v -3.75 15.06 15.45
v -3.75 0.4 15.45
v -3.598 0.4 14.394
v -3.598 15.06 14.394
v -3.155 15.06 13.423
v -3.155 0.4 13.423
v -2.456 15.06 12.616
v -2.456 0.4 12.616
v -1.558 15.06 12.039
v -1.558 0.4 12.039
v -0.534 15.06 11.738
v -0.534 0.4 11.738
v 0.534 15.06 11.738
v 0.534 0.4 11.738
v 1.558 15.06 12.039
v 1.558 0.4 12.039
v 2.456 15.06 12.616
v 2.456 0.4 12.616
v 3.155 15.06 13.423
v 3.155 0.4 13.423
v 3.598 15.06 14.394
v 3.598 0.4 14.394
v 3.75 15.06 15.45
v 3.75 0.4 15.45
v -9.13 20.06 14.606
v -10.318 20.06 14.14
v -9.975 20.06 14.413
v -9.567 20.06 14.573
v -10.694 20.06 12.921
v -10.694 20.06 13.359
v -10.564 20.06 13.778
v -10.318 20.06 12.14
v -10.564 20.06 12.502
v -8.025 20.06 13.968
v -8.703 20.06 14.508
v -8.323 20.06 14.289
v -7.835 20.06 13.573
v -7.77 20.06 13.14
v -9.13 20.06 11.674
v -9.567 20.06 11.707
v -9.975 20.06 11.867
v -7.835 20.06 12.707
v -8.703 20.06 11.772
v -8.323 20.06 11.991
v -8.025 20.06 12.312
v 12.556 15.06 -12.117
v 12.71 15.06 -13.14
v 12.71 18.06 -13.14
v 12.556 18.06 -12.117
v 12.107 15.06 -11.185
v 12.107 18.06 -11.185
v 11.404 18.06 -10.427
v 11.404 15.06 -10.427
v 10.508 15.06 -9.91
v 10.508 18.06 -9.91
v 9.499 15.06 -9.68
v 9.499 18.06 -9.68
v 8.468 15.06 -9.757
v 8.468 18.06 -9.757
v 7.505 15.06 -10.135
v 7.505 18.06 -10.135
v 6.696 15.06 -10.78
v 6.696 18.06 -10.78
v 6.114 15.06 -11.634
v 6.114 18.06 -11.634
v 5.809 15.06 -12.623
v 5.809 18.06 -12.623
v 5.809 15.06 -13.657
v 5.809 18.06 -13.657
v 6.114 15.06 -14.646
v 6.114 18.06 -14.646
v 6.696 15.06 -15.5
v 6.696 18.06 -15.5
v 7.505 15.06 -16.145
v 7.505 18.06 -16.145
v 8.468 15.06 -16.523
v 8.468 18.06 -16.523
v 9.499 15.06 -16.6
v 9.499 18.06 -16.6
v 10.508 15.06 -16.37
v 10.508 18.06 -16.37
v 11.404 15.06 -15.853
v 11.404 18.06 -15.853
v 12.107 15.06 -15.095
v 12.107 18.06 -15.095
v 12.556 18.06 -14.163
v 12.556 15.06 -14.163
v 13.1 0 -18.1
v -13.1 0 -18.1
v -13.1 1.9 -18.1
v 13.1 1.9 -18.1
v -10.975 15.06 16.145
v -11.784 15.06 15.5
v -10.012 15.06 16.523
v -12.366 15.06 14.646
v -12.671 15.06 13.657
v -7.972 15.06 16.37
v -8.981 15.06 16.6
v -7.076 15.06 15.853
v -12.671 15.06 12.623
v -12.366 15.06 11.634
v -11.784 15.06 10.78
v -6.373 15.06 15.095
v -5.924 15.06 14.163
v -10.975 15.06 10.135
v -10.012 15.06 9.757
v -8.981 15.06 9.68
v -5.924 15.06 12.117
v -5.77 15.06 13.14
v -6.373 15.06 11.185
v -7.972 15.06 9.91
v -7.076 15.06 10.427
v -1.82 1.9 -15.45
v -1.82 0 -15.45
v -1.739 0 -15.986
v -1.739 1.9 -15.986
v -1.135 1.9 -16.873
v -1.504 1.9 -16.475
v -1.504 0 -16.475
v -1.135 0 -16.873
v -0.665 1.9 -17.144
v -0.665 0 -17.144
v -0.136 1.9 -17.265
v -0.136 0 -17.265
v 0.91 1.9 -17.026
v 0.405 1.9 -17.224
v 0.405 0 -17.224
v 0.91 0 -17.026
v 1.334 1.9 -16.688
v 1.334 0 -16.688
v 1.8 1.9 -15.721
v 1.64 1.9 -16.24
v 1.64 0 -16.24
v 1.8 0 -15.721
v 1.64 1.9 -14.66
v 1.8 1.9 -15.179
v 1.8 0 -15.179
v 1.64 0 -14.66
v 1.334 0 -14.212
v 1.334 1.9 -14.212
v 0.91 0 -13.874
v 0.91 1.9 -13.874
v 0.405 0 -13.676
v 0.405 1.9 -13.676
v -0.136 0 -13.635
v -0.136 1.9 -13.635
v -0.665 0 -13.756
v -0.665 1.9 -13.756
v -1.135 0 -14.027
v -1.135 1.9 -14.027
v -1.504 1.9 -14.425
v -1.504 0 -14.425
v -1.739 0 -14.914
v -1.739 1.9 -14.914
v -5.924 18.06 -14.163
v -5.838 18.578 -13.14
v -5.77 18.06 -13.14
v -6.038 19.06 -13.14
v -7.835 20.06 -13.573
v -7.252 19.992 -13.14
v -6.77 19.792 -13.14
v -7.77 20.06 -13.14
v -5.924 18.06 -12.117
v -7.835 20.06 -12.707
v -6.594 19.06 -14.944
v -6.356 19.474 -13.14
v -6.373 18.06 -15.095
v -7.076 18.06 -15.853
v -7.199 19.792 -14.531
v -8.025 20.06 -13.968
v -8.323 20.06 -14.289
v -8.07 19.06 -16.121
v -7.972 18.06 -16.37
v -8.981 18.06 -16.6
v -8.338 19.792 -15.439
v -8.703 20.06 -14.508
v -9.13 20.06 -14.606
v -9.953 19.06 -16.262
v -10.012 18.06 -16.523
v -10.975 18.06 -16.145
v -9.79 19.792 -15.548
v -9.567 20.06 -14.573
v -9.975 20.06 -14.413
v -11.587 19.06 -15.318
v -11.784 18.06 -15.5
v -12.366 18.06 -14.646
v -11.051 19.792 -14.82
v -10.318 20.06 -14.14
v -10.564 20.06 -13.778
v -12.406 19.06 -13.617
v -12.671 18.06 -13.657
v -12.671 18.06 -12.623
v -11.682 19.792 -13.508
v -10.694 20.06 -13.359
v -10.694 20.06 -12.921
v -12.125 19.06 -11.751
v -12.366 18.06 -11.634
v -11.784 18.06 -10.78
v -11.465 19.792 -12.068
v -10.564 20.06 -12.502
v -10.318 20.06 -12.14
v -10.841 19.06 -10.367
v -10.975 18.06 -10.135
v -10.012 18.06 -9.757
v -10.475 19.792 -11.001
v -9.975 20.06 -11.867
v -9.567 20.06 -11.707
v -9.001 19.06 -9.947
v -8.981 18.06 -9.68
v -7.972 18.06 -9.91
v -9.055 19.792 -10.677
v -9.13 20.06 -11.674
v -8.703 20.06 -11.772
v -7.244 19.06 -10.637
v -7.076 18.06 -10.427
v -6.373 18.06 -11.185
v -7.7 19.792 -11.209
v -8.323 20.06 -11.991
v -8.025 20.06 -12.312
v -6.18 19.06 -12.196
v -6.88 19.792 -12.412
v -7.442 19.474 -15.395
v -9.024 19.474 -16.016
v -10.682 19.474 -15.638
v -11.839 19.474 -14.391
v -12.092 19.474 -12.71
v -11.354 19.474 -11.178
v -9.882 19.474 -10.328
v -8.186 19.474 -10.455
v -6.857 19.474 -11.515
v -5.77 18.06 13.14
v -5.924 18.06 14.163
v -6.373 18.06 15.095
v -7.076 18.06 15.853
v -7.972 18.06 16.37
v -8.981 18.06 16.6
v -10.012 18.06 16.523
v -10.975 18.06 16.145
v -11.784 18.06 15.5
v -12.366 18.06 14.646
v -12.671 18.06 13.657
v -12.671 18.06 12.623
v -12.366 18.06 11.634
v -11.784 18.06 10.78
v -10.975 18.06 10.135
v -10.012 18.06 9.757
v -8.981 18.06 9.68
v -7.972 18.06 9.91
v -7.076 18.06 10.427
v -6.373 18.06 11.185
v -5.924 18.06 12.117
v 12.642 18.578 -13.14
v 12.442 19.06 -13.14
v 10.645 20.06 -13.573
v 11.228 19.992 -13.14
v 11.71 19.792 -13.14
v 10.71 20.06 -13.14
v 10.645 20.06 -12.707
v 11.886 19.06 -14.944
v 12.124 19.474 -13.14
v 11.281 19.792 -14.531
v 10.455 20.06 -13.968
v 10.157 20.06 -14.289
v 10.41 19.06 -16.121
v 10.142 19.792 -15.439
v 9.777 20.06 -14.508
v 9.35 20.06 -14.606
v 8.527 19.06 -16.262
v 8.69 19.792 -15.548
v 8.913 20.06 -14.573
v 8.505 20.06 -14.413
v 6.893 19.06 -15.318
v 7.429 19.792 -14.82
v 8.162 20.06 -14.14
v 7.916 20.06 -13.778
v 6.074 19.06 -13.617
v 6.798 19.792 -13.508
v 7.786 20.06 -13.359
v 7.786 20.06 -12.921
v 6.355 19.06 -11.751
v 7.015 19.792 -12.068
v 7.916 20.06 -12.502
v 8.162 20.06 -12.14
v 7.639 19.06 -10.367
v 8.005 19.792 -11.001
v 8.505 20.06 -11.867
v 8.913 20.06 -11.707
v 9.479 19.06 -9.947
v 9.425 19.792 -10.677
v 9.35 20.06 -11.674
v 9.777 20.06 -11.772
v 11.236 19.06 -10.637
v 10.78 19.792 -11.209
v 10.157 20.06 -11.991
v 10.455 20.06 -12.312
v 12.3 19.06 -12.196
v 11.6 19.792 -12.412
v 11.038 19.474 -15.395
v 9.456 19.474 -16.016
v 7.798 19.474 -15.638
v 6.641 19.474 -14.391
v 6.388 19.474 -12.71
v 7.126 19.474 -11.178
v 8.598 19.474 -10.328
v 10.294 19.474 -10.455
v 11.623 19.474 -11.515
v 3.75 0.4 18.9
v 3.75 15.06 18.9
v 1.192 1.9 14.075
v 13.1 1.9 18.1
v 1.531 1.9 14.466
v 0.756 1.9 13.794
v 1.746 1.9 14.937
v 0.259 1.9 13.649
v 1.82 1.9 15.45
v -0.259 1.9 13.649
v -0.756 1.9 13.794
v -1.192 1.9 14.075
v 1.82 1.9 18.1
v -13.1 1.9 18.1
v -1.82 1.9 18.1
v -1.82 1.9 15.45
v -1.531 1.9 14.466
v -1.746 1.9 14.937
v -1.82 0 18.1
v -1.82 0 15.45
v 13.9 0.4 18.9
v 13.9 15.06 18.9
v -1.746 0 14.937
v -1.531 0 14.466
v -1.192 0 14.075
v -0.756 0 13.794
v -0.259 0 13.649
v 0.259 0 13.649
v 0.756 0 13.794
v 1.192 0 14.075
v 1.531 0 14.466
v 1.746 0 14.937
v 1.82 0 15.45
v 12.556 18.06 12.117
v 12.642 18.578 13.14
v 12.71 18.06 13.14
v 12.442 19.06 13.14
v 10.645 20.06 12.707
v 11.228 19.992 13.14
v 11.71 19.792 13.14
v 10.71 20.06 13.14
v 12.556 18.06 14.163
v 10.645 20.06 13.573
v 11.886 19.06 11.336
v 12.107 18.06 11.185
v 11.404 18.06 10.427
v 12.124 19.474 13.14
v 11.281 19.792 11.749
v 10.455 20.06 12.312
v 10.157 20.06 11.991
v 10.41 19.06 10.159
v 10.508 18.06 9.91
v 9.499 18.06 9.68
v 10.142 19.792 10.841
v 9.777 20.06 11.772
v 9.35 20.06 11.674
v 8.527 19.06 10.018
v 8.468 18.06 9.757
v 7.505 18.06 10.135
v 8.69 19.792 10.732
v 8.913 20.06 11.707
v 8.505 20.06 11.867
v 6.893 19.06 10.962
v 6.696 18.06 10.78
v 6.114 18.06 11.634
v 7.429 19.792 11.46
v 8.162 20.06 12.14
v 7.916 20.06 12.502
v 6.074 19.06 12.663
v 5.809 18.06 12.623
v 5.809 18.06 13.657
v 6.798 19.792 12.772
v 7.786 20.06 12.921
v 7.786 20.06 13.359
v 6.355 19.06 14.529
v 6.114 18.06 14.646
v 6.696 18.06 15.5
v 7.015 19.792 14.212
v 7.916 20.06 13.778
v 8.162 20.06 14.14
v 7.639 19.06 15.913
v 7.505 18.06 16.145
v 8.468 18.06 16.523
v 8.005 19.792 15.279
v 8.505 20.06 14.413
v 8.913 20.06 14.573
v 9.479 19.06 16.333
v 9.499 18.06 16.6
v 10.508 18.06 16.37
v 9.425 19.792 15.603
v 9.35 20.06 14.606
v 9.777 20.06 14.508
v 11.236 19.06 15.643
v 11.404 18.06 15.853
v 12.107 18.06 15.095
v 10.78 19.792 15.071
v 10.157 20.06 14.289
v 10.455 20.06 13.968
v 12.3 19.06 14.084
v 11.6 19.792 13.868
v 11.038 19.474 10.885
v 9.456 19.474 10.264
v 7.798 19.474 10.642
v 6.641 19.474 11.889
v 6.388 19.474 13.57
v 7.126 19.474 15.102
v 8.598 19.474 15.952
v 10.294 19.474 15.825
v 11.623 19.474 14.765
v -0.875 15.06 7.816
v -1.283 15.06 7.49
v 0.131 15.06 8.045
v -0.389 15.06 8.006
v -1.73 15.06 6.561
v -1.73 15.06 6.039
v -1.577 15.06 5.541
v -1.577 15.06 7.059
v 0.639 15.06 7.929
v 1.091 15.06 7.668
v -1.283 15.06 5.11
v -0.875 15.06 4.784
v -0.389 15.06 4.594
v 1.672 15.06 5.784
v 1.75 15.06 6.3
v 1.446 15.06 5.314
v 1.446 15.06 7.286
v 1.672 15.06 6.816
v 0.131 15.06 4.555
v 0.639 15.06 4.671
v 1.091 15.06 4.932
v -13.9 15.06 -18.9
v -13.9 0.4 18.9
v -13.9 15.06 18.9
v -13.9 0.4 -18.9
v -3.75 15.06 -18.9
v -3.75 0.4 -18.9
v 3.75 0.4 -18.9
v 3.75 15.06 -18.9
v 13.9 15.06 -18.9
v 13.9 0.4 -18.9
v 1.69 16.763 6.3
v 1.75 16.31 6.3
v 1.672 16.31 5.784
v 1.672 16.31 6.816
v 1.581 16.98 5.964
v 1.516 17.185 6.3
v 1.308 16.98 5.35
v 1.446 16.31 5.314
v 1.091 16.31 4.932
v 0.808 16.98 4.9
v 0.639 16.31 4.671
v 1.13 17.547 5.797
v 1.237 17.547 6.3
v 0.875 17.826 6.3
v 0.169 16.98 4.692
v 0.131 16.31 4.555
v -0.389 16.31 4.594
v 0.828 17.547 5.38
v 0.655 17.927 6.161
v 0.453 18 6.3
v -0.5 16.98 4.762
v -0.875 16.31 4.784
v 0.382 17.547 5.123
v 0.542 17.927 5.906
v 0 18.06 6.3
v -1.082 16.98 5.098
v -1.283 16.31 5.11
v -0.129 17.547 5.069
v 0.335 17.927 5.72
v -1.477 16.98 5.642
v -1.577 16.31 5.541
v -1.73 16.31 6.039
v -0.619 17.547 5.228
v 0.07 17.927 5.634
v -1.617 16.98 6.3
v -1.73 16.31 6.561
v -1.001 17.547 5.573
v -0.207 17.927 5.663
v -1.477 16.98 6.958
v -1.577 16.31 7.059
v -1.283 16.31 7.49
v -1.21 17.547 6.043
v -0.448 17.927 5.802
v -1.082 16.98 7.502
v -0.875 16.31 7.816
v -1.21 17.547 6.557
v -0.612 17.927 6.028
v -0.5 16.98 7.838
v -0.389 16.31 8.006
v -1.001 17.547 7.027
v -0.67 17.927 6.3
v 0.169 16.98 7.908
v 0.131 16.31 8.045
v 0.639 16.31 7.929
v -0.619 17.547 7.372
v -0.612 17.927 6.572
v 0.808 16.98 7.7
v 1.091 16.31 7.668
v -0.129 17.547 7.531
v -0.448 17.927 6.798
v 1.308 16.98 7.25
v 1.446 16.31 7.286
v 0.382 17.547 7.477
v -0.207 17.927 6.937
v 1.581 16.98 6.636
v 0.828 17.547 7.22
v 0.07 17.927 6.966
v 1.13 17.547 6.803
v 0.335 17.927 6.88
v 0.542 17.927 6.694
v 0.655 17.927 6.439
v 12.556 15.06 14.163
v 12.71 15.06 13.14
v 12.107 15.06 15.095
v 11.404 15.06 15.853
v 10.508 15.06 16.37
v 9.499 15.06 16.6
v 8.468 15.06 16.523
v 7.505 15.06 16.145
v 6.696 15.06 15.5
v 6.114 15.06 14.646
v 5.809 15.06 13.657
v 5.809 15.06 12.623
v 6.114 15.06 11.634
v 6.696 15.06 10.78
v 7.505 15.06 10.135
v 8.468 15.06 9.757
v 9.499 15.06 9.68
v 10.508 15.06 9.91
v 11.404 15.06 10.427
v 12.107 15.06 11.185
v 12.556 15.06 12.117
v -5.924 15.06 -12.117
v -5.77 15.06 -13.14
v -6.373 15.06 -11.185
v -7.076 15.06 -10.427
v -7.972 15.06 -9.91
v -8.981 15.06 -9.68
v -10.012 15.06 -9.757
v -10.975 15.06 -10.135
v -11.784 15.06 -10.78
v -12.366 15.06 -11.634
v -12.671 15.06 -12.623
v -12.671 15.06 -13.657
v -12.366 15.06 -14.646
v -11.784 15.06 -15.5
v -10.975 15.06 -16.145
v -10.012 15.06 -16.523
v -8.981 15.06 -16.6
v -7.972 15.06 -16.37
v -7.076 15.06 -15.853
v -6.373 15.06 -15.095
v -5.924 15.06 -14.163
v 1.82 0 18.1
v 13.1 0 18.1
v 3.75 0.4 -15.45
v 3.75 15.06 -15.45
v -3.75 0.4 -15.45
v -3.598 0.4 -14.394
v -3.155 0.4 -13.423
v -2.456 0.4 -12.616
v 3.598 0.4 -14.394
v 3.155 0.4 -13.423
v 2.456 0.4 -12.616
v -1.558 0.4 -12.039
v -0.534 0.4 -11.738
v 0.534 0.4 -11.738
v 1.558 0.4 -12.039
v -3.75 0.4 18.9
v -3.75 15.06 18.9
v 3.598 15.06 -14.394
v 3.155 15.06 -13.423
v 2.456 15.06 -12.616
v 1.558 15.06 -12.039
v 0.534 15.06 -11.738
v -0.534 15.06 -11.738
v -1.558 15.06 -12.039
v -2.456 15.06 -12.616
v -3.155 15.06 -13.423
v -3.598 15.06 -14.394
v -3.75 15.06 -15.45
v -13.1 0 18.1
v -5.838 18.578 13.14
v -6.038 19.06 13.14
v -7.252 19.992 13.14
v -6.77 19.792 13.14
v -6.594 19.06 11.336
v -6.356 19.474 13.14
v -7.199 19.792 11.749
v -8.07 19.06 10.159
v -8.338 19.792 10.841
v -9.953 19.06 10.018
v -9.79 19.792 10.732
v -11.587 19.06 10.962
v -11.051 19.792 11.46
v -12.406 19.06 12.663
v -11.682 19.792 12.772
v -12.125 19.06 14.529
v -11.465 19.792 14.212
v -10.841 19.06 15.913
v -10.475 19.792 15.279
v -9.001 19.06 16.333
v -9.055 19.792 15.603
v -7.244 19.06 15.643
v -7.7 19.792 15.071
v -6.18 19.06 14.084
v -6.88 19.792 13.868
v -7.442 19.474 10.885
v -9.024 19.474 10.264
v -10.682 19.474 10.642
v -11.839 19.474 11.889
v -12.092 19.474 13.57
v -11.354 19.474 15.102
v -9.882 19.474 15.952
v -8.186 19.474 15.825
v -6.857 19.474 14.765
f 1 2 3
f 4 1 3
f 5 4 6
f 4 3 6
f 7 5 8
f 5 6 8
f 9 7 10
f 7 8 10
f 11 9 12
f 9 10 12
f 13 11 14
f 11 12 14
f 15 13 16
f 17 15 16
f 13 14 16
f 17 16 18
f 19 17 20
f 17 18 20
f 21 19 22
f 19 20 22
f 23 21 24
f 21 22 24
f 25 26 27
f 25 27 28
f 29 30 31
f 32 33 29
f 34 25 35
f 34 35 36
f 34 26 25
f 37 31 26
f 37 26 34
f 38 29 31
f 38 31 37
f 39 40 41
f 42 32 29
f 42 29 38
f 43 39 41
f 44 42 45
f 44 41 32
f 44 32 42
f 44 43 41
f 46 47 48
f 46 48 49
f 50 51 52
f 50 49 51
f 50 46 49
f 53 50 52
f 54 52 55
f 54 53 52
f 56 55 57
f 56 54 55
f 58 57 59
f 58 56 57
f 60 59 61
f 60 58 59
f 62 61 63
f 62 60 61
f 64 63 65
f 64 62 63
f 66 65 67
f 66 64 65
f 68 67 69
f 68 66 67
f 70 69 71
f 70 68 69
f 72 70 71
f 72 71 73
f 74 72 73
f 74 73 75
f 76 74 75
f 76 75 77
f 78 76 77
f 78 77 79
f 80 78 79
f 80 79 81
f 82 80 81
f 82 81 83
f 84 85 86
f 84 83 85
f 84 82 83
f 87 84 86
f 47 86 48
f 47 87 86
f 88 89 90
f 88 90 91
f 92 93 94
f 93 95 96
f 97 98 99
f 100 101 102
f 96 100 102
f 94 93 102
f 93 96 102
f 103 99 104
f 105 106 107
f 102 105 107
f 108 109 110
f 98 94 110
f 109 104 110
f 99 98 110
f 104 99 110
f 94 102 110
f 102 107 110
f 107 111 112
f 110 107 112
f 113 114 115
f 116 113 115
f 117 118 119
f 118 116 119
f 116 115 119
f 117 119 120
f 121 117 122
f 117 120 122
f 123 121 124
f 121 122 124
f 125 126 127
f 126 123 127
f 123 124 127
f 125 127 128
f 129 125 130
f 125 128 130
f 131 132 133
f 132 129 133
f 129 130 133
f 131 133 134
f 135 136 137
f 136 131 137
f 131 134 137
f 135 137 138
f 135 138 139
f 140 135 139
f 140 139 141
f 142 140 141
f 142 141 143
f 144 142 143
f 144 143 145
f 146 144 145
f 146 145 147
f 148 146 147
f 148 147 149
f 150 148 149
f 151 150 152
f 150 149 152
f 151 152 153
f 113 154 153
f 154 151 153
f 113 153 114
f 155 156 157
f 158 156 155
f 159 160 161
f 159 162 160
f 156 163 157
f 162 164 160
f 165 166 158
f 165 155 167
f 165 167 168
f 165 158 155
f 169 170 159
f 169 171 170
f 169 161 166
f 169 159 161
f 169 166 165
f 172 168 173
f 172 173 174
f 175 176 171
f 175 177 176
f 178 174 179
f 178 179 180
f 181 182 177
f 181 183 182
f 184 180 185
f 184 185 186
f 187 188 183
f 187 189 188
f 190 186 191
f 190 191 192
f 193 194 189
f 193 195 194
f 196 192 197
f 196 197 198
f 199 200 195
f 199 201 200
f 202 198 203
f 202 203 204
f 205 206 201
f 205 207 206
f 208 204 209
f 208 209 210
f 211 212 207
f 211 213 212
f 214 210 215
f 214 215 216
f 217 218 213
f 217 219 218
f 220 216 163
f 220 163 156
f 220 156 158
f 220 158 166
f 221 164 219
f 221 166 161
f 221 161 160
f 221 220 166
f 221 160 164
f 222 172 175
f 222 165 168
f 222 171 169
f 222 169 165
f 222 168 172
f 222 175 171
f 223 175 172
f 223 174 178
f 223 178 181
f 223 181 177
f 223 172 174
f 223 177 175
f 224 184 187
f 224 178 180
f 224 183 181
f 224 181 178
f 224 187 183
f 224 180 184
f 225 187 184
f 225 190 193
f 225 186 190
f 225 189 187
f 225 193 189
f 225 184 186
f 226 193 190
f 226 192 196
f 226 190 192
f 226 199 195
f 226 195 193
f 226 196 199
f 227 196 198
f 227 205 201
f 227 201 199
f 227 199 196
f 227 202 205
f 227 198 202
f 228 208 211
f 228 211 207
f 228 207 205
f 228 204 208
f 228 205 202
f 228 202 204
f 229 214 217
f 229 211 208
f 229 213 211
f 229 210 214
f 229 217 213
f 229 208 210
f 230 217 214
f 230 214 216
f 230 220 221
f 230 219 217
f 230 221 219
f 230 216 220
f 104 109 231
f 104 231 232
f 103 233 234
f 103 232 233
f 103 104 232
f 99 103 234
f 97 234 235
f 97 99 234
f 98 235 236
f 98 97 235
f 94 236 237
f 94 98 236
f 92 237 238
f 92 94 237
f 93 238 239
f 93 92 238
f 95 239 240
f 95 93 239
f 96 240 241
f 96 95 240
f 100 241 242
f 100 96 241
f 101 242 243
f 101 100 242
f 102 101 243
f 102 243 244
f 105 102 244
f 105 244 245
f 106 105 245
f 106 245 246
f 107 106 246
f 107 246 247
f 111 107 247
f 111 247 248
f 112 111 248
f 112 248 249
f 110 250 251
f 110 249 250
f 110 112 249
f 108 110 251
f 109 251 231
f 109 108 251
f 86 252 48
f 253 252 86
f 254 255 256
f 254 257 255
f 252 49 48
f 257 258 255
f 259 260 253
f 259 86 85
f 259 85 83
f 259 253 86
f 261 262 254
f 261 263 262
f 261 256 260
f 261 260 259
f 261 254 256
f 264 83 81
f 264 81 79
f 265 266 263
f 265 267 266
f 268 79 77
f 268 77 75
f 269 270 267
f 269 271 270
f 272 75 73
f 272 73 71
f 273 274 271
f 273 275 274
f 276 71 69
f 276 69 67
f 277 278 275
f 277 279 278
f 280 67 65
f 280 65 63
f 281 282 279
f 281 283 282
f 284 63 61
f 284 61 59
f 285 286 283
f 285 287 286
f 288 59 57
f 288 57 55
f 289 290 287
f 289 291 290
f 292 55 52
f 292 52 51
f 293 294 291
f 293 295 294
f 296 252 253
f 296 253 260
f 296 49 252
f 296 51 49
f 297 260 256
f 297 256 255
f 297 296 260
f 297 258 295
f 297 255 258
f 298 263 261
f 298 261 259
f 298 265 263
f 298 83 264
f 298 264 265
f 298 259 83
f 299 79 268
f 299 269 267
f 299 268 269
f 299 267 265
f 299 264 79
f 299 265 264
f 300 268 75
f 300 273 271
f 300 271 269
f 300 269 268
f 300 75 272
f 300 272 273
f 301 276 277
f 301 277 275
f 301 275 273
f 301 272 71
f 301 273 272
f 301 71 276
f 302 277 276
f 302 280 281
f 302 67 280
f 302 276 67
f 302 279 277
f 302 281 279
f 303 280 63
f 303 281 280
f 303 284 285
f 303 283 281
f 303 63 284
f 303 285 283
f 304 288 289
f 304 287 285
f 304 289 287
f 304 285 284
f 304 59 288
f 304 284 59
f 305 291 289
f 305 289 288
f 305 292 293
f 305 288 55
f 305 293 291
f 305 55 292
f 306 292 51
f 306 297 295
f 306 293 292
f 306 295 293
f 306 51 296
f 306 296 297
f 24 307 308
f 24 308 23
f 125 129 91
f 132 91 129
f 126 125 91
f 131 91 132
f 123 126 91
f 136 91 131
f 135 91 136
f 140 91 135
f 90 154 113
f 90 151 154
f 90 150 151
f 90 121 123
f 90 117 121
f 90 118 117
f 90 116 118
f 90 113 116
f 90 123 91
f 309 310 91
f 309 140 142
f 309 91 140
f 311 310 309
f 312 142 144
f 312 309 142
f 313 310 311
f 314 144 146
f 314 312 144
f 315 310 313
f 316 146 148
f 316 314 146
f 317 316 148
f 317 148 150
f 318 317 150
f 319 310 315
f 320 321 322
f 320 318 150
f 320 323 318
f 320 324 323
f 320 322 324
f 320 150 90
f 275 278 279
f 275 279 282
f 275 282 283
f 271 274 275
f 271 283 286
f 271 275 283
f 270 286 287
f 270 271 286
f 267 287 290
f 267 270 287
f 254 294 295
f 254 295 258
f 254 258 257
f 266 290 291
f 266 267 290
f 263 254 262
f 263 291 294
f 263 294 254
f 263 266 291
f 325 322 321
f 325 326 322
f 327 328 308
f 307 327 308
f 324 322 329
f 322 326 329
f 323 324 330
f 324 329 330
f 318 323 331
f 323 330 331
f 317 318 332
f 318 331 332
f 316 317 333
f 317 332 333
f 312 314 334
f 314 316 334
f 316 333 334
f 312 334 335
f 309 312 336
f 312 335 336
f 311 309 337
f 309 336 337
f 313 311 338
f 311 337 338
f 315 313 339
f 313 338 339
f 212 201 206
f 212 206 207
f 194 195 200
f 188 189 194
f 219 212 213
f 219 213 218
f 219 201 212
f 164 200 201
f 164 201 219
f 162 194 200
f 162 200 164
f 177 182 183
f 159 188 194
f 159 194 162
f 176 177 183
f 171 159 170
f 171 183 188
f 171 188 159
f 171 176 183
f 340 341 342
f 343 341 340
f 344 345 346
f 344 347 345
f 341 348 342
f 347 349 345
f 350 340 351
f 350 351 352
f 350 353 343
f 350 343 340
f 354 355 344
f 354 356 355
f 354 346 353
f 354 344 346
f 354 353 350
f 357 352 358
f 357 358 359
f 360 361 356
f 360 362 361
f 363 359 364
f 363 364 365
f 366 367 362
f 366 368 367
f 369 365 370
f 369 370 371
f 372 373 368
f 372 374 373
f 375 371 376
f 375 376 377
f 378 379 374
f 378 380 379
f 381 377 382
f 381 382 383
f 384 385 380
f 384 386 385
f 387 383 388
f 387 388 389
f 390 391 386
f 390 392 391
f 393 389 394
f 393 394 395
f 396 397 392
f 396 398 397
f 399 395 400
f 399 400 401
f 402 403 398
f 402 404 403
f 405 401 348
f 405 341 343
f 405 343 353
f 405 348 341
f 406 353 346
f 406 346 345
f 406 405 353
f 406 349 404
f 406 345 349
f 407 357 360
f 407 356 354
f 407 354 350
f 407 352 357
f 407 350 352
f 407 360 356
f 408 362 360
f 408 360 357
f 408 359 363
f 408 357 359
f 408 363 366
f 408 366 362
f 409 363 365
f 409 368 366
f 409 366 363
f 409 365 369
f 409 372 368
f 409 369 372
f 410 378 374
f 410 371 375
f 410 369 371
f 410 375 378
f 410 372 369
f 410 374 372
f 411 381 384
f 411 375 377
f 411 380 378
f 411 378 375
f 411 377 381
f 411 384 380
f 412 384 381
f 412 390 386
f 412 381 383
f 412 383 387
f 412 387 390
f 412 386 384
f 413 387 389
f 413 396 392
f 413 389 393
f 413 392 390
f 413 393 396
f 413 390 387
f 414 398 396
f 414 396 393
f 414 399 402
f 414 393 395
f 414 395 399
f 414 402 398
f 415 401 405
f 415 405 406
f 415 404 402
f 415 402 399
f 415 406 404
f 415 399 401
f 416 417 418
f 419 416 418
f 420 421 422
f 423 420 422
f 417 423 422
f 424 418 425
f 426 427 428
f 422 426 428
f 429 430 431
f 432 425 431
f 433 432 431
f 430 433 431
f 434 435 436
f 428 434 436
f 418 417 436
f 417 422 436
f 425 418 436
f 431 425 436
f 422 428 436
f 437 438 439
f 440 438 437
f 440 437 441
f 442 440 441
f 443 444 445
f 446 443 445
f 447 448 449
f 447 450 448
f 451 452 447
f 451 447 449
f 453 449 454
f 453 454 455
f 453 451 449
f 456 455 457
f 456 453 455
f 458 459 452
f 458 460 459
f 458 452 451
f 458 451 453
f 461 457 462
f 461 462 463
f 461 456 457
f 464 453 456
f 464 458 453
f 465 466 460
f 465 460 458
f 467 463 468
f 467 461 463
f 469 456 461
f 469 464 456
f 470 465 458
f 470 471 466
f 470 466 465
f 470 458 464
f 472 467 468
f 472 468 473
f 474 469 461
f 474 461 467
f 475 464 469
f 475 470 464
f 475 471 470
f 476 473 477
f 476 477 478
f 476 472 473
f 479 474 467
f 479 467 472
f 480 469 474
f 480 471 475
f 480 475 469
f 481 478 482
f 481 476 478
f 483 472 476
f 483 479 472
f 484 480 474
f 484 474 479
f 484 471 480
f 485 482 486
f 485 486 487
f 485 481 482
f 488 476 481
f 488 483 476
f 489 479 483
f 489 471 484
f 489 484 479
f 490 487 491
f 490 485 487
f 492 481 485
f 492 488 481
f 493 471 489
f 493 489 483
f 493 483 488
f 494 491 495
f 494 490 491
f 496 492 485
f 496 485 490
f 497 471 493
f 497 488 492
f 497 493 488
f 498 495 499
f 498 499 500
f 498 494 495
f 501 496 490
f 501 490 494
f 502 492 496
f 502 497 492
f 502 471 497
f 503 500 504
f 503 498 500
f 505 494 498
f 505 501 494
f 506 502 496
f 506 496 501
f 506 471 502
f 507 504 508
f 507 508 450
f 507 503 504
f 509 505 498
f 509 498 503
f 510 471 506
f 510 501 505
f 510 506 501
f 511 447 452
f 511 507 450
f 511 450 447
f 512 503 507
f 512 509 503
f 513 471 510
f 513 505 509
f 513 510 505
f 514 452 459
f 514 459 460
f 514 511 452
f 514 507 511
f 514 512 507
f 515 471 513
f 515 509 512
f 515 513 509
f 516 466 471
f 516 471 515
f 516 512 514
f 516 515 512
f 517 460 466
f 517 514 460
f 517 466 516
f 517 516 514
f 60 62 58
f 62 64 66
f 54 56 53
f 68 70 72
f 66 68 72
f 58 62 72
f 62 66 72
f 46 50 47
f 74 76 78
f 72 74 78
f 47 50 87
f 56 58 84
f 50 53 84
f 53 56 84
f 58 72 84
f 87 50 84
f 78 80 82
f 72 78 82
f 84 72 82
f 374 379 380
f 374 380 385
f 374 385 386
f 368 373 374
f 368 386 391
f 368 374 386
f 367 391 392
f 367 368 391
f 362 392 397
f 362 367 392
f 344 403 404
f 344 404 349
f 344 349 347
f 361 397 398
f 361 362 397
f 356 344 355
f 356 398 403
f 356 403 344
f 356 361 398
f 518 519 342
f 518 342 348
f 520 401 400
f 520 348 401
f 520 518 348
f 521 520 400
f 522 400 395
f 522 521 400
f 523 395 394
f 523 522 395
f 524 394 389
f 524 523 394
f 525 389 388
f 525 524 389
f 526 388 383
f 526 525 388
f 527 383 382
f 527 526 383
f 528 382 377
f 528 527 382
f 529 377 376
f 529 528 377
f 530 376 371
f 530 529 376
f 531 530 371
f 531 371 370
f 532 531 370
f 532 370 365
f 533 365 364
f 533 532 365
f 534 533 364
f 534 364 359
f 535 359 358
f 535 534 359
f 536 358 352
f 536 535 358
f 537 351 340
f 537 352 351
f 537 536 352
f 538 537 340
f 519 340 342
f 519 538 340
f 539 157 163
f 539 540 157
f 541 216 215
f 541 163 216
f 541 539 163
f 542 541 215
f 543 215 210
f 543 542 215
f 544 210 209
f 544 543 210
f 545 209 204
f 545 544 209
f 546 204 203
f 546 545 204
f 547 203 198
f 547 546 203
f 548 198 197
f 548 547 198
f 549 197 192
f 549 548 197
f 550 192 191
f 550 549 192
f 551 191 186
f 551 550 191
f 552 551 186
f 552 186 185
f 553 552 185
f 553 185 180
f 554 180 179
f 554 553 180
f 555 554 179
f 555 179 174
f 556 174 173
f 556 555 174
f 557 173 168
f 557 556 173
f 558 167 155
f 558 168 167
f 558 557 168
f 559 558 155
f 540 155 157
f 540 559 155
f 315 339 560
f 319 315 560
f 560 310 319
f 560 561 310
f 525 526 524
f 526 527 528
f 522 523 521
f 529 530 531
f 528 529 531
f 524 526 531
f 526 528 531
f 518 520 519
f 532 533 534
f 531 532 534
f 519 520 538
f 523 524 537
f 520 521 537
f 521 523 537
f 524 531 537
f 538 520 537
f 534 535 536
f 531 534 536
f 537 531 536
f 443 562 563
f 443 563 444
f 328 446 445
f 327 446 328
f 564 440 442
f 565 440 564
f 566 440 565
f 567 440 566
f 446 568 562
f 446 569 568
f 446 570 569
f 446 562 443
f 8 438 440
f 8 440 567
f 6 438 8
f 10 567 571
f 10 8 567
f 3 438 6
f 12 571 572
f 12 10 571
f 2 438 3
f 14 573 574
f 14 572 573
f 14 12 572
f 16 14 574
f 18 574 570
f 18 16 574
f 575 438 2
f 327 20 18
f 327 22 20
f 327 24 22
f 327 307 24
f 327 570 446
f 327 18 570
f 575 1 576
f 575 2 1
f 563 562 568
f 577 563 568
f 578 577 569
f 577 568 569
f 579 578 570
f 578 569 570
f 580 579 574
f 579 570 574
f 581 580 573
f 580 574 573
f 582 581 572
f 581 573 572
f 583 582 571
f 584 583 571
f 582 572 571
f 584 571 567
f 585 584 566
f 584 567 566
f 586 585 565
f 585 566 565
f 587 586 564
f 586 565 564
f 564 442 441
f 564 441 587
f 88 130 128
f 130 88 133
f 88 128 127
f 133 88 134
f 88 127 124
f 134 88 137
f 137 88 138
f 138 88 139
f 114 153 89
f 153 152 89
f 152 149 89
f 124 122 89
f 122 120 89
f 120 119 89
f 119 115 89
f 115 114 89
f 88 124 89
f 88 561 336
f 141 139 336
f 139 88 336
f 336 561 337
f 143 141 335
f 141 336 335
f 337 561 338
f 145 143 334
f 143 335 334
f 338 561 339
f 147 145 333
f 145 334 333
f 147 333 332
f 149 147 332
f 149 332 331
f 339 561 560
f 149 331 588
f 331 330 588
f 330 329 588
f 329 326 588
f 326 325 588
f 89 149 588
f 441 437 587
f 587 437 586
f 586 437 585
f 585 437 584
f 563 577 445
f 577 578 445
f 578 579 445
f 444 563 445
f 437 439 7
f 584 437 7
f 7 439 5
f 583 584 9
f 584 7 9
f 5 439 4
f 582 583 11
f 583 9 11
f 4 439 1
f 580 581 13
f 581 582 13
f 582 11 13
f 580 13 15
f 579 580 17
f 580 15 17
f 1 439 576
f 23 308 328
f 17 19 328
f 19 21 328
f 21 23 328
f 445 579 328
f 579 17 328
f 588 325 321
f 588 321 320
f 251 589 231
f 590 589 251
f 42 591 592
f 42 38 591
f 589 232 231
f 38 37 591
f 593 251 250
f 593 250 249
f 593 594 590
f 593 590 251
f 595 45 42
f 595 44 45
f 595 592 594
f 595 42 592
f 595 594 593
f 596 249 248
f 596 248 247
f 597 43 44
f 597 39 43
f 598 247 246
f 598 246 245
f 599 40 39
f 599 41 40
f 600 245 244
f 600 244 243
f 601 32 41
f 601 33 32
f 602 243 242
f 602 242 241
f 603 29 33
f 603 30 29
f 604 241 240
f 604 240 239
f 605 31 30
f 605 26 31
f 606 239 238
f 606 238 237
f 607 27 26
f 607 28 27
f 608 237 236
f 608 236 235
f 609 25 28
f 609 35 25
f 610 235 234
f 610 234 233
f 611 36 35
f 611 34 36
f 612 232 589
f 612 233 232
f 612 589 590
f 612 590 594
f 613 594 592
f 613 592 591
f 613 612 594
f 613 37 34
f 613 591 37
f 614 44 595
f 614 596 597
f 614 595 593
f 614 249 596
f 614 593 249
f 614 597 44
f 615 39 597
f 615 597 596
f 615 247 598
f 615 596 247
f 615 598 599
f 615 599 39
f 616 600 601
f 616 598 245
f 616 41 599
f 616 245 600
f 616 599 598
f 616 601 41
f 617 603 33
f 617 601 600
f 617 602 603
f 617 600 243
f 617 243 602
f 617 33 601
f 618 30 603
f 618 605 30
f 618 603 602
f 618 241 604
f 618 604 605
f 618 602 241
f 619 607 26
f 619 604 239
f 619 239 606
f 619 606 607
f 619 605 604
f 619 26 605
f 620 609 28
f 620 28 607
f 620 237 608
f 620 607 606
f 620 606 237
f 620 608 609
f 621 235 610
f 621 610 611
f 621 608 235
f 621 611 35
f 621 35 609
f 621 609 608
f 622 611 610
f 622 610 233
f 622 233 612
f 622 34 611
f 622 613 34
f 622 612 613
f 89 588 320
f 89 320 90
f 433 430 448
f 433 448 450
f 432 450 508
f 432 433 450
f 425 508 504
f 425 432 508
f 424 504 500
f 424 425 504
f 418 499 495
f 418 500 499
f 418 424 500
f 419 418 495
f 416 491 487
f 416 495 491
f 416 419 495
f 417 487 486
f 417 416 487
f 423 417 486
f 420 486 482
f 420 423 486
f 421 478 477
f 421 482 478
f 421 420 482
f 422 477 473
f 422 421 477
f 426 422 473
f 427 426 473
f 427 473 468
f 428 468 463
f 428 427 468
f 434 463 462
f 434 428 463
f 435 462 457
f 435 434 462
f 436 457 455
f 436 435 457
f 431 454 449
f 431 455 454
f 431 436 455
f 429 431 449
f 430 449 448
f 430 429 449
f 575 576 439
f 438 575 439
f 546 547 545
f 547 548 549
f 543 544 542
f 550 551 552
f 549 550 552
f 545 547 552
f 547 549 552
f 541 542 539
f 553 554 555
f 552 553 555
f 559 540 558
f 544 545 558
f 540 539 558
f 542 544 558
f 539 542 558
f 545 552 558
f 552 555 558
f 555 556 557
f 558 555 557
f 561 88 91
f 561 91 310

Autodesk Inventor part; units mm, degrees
ref_plane "YZ Plane" through (0, 0, 0) normal (1, 0, 0) x (0, 1, 0)
ref_plane "XZ Plane" through (0, 0, 0) normal (0, 1, 0) x (-1, 0, 0)
sketch "Sketch1" plane through (0, 0, 0) normal (0, 1, 0) x (-1, 0, 0)
  line L0 (13.1, -18.1) -> (-13.1, -18.1)
  line L1 (-13.1, -18.1) -> (-13.1, 18.1)
  line L2 (13.1, 18.1) -> (13.1, -18.1)
  circle A0 centre (0, -15.45) radius 1.82
  arc A1 (-1.82, 15.45) -> (1.82, 15.45) centre (0, 15.45) ccw
  line L3 (-1.82, 15.45) -> (-1.82, 18.1)
  line L4 (1.82, 15.45) -> (1.82, 18.1)
  line L5 (-13.1, 18.1) -> (-1.82, 18.1)
  line L6 (1.82, 18.1) -> (13.1, 18.1)
  point P0 (0, 0)
  dimension "d1" = 26.2
  dimension "d2" = 13.1
  dimension "d6" = 3.64
  dimension "d7" = 2.65
  dimension "d8" = 3.64
  dimension "d10" = 36.2
  dimension "d11" = 18.1
  dimension "d12" = 2.65
extrude "Extrusion1" add sketch "Sketch1" along normal blind 1.9
ref_plane "Work Plane1" through (0, 0.4, 0) normal (0, -1, 0) x (1, 0, 0)
sketch "Sketch2" plane through (0, 0.4, 0) normal (0, -1, 0) x (1, 0, 0)
  line L0 (1.82, 18.1) -> (13.1, 18.1) projected
  line L1 (13.1, 18.1) -> (13.1, -18.1) projected
  line L2 (13.1, -18.1) -> (-13.1, -18.1) projected
  line L3 (-13.1, -18.1) -> (-13.1, 18.1) projected
  line L4 (-13.1, 18.1) -> (-1.82, 18.1) projected
  line L5 (-1.82, 18.1) -> (-1.82, 15.45) projected
  arc A0 (-1.82, 15.45) -> (1.82, 15.45) centre (0, 15.45) ccw projected
  line L6 (1.82, 15.45) -> (1.82, 18.1) projected
  circle A1 centre (0, -15.45) radius 1.82 projected
  line L7 (-13.9, 18.9) -> (-13.9, -18.9)
  line L8 (13.9, -18.9) -> (13.9, 18.9)
  line L9 (13.9, 18.9) -> (3.75, 18.9)
  line L10 (-3.75, 18.9) -> (-13.9, 18.9)
  line L11 (3.75, 18.9) -> (3.75, 15.45)
  line L12 (-3.75, 15.45) -> (-3.75, 18.9)
  arc A2 (-3.75, 15.45) -> (3.75, 15.45) centre (0, 15.45) ccw
  line L13 (-3.8538, -18.9) -> (-3.75, -18.9)
  line L14 (-13.9, -18.9) -> (-3.8538, -18.9)
  line L15 (3.75, -15.45) -> (3.75, -18.9)
  line L16 (-3.75, -18.9) -> (-3.75, -15.45)
  arc A3 (3.75, -15.45) -> (-3.75, -15.45) centre (0, -15.45) ccw
  line L17 (3.75, -18.9) -> (13.9, -18.9)
  point P0 (0, 0)
  point P1 (-3.75, 45.4974)
  point P2 (-3.8019, -18.9)
  point P3 (3.75, 18.1)
  point P4 (-3.75, 18.1)
  point P5 (-3.75, -18.1)
  point P6 (3.75, -18.1)
  dimension "d14" = 0.8
  dimension "d15" = 7.5
  dimension "d17" = 0.8
  dimension "d18" = 0.8
  dimension "d20" = 0.8
  dimension "d21" = 3.75
extrude "Extrusion2" add sketch "Sketch2" against normal blind 14.66 separate body contours L11 L9 L8 L17 L15 L2 L1 L0 | L0 L1 L2 L15 A3 L16 L3 L4 L12 A2 L11 | L4 L3 L2 L16 L13 L14 L7 L10 L12
sketch "Sketch3" plane through (0, 15.06, 0) normal (0, 1, 0) x (1, 0, 0)
  circle A0 centre (-9.24, 13.14) radius 3.47
  circle A1 centre (9.24, 13.14) radius 3.47
  circle A2 centre (9.24, -13.14) radius 3.47
  circle A3 centre (-9.24, -13.14) radius 3.47
  line L0 (13.9, -18.9) -> (13.9, 18.9) projected
  line L1 (13.9, 18.9) -> (3.75, 18.9) projected
  line L2 (-13.9, 18.9) -> (-13.9, -18.9) projected
  line L3 (3.75, -18.9) -> (13.9, -18.9) projected
  point P0 (0, 0)
  dimension "d26" = 4.66
  dimension "d27" = 5.76
  dimension "d28" = 6.94
  dimension "d29" = 4.66
  dimension "d30" = 5.76
extrude "Extrusion3" add sketch "Sketch3" along normal blind 5 separate body
fillet "Fillet1" radius 2 4 edges at (-12.71, 20.06, -13.14) (5.77, 20.06, -13.14) (5.77, 20.06, 13.14) (-12.71, 20.06, 13.14)
sketch "Sketch4" plane through (0, 15.06, 0) normal (0, 1, 0) x (1, 0, 0)
  circle A0 centre (0, -6.3) radius 1.75
  line L0 (3.75, -18.9) -> (13.9, -18.9) projected
  point P0 (0, 0)
  dimension "d34" = 3.5
  dimension "d35" = 12.6
extrude "Extrusion4" add sketch "Sketch4" along normal blind 3 separate body
fillet "Fillet2" radius 1.75 1 edges at (-1.75, 18.06, 6.3)
equation "\"d2\" = 0.5 * d1"
equation "\"d8\" = d6"
equation "\"d12\" = d7"
equation "\"d17\" = d14"
equation "\"d18\" = d17"
equation "\"d29\" = d26"
equation "\"d30\" = d27"
equation "\"d3\" = 0.5 * d0"
equation "\"d9\" = d7"
equation "\"d0\" = 36.2"
properties part number "solid state relay"
